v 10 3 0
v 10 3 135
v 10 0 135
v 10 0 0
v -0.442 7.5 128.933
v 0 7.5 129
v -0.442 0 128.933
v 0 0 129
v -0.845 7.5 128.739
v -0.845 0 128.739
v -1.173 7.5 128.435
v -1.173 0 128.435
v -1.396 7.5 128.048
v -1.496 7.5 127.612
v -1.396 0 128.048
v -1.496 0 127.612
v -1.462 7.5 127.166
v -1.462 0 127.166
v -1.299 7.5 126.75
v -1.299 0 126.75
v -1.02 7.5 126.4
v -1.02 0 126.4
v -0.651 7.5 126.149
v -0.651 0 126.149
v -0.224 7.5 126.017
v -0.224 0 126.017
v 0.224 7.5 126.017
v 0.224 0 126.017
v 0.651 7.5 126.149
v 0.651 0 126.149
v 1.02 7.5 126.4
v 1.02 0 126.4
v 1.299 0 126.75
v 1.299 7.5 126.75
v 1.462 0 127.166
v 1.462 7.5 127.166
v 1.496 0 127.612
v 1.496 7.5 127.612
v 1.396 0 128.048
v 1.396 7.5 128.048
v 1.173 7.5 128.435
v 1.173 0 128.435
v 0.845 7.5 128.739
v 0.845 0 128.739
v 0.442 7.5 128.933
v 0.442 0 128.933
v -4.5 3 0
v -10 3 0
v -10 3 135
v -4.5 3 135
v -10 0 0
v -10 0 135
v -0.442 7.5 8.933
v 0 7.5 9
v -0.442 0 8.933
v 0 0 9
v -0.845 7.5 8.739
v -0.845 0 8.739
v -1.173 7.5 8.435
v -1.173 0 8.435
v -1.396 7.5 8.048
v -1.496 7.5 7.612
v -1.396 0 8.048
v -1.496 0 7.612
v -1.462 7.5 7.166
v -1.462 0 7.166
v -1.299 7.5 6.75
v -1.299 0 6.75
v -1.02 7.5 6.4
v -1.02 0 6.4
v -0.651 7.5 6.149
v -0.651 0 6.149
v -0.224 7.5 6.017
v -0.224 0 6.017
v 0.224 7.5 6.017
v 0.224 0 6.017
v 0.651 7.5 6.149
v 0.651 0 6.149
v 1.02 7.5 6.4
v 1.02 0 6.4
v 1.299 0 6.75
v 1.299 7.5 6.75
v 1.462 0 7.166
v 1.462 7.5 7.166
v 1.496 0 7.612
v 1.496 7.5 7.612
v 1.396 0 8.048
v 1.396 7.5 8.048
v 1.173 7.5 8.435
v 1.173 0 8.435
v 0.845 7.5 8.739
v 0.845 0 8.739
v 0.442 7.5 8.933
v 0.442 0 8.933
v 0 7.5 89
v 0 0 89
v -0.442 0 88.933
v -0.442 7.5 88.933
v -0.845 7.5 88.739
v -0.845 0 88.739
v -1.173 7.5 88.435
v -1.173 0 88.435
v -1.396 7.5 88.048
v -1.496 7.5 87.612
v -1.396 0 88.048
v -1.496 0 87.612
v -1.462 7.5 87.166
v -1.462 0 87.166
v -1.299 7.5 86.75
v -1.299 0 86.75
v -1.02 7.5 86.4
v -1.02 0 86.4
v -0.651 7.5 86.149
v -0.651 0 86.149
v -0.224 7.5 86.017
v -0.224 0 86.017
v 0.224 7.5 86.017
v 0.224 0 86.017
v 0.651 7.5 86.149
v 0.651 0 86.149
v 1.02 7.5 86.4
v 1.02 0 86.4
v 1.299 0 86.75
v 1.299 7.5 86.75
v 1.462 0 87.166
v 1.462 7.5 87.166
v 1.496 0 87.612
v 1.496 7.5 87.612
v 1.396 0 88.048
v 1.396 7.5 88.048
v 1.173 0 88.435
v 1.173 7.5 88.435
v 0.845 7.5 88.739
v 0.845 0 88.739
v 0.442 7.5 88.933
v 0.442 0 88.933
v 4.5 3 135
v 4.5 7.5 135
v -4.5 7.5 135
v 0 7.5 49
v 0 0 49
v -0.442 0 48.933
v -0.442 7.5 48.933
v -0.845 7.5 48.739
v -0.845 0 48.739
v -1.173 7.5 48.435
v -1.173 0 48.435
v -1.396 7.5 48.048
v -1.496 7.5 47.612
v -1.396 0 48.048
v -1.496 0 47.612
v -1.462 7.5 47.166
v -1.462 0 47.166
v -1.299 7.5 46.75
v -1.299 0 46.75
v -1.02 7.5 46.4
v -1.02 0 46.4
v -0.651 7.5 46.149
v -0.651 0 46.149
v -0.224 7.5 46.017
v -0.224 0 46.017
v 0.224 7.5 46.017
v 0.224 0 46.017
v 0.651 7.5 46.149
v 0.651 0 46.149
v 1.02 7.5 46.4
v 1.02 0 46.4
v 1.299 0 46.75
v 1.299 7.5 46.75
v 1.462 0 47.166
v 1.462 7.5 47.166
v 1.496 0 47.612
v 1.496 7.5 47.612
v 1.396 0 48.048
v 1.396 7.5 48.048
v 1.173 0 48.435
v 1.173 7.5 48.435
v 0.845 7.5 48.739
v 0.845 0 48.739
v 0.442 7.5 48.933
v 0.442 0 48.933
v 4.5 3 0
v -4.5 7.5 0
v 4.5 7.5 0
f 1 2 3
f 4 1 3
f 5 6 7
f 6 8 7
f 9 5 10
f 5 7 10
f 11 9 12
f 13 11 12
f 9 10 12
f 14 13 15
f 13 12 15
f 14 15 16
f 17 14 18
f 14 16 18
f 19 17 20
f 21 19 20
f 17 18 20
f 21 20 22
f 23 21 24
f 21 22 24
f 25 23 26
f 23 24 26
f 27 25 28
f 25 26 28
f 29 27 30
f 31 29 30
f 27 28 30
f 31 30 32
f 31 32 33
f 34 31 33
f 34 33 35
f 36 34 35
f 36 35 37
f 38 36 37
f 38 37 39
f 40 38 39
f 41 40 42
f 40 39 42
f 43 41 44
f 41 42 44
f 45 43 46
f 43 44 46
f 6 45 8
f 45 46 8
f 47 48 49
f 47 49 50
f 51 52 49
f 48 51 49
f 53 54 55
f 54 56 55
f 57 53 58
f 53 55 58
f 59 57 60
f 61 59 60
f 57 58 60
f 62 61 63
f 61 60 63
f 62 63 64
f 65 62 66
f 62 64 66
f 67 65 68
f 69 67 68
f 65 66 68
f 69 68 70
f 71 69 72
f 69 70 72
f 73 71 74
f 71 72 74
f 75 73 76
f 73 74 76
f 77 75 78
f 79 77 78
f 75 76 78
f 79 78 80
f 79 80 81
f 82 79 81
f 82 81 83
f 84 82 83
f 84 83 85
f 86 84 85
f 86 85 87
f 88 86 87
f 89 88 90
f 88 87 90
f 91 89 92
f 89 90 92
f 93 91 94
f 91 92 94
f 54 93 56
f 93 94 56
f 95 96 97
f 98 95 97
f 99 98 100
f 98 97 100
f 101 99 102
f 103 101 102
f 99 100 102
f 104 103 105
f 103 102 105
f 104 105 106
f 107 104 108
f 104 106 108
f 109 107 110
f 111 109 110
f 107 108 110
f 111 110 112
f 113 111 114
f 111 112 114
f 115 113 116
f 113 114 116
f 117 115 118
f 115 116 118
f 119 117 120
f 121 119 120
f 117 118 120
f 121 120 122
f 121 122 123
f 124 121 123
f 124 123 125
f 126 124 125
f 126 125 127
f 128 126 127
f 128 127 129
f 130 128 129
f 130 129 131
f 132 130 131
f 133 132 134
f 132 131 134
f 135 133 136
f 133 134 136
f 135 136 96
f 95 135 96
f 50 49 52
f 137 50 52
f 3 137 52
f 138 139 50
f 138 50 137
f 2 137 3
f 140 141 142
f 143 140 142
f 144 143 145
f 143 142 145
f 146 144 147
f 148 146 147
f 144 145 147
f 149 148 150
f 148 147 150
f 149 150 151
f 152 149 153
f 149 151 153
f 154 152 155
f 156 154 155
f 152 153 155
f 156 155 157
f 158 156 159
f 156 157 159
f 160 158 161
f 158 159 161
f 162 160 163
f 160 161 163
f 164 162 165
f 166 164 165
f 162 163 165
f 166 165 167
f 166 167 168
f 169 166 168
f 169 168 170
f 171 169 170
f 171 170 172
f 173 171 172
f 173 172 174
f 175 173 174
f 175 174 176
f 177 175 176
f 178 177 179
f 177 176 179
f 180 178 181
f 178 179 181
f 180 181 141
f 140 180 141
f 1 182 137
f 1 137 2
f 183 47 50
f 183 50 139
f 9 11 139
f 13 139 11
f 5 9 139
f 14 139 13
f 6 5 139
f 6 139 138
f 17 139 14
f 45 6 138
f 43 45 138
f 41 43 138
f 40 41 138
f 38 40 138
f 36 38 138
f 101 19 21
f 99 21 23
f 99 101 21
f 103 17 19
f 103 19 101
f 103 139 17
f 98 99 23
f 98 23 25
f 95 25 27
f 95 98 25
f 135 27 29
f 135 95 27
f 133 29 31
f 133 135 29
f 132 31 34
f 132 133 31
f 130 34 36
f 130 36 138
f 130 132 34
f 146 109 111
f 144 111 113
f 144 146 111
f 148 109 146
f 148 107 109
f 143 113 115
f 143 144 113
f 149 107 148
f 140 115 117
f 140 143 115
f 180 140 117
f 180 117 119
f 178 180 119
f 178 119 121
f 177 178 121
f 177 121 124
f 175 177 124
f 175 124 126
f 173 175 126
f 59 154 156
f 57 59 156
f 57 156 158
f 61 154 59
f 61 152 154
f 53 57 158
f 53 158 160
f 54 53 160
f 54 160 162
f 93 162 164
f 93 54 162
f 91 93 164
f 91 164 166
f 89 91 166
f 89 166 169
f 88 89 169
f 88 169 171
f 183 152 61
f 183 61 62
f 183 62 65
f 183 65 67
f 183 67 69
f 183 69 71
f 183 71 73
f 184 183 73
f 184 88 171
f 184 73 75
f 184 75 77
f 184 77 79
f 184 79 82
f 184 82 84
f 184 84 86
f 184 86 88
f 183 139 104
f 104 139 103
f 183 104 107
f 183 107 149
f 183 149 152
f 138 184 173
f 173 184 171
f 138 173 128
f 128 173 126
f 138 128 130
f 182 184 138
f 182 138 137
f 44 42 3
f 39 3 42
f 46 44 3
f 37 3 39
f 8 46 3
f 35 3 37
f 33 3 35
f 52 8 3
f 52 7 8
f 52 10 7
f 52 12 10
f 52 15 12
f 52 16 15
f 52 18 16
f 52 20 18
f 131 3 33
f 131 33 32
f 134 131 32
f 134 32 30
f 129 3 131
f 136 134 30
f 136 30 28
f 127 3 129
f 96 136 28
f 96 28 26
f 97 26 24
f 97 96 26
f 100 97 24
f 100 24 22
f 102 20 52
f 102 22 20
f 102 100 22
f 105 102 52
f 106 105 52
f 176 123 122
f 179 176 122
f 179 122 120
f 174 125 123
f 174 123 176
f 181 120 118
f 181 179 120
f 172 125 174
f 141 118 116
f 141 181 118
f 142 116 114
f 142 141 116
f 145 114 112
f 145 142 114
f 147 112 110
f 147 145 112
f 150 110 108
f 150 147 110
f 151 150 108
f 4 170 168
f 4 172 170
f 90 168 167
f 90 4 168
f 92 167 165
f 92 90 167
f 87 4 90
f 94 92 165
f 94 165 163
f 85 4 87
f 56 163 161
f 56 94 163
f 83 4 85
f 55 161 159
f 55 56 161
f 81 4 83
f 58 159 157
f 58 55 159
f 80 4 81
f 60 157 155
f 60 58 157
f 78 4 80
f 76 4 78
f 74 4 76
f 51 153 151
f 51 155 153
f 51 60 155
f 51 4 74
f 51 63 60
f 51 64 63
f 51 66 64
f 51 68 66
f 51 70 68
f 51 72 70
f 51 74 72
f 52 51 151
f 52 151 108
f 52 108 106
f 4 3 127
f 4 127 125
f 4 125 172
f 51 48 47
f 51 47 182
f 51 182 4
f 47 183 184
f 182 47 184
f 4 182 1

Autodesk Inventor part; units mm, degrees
ref_plane "YZ Plane" through (0, 0, 0) normal (1, 0, 0) x (0, 1, 0)
ref_plane "XZ Plane" through (0, 0, 0) normal (0, 1, 0) x (-1, 0, 0)
ref_plane "XY Plane" through (0, 0, 0) normal (0, 0, 1) x (1, 0, 0)
sketch "スケッチ1" plane through (0, 0, 0) normal (0, 0, 1) x (1, 0, 0)
  line L0 (-10, 3) -> (-4.5, 3)
  line L1 (10, 3) -> (10, 0)
  line L2 (10, 0) -> (-10, 0)
  line L3 (-10, 0) -> (-10, 3)
  line L4 (-10, 3) -> (10, 0) construction
  line L5 (10, 3) -> (-10, 0) construction
  line L6 (-4.5, 7.5) -> (4.5, 7.5)
  line L7 (4.5, 7.5) -> (4.5, 3)
  line L8 (-4.5, 3) -> (-4.5, 7.5)
  line L9 (-4.5, 7.5) -> (4.5, 3) construction
  line L10 (4.5, 7.5) -> (-4.5, 3) construction
  line L11 (4.5, 3) -> (10, 3)
  point P0 (0, 0)
  point P1 (0, 1.5)
  point P2 (0, 5.25)
  dimension "d0" = 20
  dimension "d1" = 3
  dimension "d2" = 9
  dimension "d3" = 4.5
extrude "押し出し1" add sketch "スケッチ1" along normal blind 135
sketch "スケッチ2" plane through (-4.5, 7.5, 0) normal (0, 1, 0) x (1, 0, 0)
  line L0 (0, 0) -> (9, 0) projected
  line L1 (9, -135) -> (0, -135) projected
  point P0 (4.5, 0)
  point P1 (4.5, -7.5)
  point P2 (4.5, -47.5)
  point P3 (4.5, -87.5)
  point P4 (4.5, -127.5)
  dimension "d6" = 7.5
  dimension "d7" = 40
  dimension "d8" = 40
  dimension "d9" = 40
  dimension "d10" = 7.5
hole "穴1" at (0, 7.5, 7.5) at (0, 7.5, 47.5) at (0, 7.5, 87.5) at (0, 7.5, 127.5) direction (0, -1, 0) diameter 3 end through all
equation "\"d8\" = d7"
equation "\"d9\" = d7"
properties part number "slider_b7p5x20_135_sa" material "アルミニウム 6061-AHC"
